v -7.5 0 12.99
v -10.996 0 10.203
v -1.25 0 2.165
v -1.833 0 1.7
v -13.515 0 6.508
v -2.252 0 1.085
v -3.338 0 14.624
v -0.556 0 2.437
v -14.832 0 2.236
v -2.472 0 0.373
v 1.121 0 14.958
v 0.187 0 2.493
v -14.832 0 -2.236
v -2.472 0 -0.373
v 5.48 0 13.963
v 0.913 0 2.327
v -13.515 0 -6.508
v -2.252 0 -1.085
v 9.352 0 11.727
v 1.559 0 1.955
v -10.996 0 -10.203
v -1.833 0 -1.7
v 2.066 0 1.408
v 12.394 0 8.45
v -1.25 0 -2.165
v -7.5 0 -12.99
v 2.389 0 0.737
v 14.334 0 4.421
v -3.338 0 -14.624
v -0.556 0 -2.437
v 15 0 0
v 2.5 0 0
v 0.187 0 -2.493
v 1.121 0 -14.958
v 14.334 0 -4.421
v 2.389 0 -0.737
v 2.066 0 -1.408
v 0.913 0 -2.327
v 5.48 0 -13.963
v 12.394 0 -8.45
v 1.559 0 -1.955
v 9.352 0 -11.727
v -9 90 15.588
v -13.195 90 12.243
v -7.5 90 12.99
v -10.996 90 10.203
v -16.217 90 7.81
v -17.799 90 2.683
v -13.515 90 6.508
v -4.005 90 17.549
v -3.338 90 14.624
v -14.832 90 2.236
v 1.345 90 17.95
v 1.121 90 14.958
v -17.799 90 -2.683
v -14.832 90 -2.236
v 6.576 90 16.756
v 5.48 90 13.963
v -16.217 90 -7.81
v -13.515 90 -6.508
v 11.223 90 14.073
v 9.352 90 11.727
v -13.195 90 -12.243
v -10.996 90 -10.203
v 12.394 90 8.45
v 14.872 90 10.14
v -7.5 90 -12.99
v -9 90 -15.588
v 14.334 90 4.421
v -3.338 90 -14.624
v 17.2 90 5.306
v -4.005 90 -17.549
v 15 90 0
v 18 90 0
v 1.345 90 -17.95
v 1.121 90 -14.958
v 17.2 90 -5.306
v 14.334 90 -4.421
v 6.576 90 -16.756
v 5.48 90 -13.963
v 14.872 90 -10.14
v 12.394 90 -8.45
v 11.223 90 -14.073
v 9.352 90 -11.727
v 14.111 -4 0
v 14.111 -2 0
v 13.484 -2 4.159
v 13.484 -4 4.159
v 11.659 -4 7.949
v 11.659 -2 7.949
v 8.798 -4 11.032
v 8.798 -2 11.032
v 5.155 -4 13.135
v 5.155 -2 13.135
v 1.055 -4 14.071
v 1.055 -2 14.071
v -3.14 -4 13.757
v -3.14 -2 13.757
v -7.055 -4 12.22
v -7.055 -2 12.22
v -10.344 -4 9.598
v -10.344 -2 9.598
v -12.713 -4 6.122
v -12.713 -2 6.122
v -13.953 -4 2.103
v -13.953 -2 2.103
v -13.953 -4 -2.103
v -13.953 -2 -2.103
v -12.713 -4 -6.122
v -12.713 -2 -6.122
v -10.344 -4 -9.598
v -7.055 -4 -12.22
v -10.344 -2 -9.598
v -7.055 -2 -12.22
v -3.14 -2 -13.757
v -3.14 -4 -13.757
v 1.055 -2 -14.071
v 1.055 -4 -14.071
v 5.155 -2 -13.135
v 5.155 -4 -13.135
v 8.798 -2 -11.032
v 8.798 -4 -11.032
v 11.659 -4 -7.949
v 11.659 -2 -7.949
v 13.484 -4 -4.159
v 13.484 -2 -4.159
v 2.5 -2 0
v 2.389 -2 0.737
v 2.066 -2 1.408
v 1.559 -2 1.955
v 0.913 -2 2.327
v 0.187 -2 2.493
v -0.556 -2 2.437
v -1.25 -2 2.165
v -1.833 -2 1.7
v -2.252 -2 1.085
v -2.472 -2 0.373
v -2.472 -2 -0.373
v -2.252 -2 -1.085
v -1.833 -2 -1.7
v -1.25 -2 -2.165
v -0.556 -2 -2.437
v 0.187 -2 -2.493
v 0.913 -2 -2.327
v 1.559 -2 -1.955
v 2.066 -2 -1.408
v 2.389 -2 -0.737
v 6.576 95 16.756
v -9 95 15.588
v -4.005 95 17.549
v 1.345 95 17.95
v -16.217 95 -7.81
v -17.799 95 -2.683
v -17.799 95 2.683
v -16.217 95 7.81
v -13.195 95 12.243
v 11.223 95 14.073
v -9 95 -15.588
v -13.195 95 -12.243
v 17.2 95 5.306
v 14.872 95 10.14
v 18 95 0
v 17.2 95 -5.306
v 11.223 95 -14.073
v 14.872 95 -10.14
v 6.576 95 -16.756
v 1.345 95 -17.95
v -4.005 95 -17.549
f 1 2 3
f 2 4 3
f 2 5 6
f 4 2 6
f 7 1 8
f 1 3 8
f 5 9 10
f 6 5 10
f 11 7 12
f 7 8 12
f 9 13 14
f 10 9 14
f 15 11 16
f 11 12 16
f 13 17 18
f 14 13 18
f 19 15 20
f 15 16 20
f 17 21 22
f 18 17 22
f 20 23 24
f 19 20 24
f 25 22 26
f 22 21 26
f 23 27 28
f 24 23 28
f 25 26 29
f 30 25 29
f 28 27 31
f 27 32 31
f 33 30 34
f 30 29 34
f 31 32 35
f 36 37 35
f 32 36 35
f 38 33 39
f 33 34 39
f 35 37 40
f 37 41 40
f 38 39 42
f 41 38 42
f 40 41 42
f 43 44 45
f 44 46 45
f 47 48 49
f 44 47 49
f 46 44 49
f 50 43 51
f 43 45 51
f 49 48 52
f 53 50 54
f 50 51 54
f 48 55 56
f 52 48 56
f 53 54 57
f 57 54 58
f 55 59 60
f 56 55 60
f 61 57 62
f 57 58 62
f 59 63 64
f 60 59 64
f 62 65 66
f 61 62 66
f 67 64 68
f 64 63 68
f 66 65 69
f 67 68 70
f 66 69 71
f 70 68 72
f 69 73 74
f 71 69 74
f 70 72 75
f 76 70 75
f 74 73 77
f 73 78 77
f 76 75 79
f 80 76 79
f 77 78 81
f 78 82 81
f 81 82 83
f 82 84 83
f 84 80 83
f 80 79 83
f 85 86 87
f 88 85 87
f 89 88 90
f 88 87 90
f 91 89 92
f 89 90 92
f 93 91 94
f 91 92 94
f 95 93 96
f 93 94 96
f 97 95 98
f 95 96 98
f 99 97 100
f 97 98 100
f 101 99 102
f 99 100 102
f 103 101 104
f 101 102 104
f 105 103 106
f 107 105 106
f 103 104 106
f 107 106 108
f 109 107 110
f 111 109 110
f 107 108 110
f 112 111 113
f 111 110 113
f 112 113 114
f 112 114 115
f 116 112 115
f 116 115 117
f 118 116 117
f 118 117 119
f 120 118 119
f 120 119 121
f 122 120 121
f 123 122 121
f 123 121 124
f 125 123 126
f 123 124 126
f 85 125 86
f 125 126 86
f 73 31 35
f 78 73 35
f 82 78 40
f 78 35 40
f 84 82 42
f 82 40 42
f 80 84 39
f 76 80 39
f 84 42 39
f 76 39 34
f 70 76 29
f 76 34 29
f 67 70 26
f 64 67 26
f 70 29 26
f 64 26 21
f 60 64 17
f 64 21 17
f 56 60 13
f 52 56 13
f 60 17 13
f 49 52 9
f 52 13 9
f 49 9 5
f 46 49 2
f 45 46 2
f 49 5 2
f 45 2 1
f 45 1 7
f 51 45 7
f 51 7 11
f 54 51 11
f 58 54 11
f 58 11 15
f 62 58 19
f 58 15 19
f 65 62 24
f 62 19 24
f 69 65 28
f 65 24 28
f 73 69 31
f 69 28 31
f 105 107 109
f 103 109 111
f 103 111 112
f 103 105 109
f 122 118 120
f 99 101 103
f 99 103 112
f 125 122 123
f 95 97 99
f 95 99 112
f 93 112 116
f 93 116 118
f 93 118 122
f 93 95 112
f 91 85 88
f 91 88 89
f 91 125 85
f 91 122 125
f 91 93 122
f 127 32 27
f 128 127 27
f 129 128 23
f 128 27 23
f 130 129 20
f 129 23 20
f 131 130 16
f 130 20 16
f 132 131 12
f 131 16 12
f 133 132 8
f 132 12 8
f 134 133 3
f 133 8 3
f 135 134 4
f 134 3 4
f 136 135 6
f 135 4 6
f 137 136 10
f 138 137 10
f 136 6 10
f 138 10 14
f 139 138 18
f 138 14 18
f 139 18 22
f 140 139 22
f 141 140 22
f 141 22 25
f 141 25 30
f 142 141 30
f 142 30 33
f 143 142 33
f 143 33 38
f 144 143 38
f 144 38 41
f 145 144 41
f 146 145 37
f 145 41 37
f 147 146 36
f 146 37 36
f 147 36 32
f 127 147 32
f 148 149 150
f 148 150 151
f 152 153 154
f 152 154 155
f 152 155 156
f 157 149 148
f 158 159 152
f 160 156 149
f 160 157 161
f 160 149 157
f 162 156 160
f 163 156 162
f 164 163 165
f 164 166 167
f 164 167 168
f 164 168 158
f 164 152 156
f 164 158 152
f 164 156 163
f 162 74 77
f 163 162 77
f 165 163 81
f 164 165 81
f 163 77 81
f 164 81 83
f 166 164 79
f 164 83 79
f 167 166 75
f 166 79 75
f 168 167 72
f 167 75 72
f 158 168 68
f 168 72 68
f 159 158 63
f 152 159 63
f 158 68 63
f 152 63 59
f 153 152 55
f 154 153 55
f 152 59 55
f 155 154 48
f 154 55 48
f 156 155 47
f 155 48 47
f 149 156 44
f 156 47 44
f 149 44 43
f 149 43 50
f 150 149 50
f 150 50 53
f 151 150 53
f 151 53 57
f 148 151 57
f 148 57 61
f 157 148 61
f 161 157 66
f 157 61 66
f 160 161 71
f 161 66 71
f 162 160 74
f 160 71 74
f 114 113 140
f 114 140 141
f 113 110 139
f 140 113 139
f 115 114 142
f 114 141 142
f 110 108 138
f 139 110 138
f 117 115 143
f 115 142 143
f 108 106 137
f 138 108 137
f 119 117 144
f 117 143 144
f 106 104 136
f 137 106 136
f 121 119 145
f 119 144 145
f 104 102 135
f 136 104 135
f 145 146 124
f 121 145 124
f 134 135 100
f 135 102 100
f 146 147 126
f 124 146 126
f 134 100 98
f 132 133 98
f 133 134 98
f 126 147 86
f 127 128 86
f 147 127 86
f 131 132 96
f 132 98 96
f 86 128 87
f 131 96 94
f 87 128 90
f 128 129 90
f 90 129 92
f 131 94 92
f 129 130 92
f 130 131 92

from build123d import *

# Parameters (mm, degrees)
SKETCH1_R           = 15
BOSS_EXTRUDE1_DEPTH = 90
SKETCH2_R           = 18
BOSS_EXTRUDE2_DEPTH = 5
SKETCH3_R           = 2.5
BOSS_EXTRUDE3_DEPTH = 2
SKETCH4_R           = 14.11079173
BOSS_EXTRUDE4_DEPTH = 2


with BuildPart() as part:
    # Sketch1 → Boss-Extrude1 (new body)
    with BuildSketch(Plane(origin=(0, 0, 0), x_dir=(1, 0, 0), z_dir=(0, 1, 0))):
        Circle(SKETCH1_R)
    extrude(amount=BOSS_EXTRUDE1_DEPTH)

    # Sketch2 → Boss-Extrude2 (add)
    with BuildSketch(Plane(origin=(0, 90, 0), x_dir=(1, 0, 0), z_dir=(0, 1, 0))):
        Circle(SKETCH2_R)
    extrude(amount=BOSS_EXTRUDE2_DEPTH)

    # Sketch3 → Boss-Extrude3 (add)
    with BuildSketch(Plane.XZ):
        Circle(SKETCH3_R)
    extrude(amount=BOSS_EXTRUDE3_DEPTH)

    # Sketch4 → Boss-Extrude4 (add)
    with BuildSketch(Plane.XZ.offset(2)):
        Circle(SKETCH4_R)
    extrude(amount=BOSS_EXTRUDE4_DEPTH)


solid = part.part
